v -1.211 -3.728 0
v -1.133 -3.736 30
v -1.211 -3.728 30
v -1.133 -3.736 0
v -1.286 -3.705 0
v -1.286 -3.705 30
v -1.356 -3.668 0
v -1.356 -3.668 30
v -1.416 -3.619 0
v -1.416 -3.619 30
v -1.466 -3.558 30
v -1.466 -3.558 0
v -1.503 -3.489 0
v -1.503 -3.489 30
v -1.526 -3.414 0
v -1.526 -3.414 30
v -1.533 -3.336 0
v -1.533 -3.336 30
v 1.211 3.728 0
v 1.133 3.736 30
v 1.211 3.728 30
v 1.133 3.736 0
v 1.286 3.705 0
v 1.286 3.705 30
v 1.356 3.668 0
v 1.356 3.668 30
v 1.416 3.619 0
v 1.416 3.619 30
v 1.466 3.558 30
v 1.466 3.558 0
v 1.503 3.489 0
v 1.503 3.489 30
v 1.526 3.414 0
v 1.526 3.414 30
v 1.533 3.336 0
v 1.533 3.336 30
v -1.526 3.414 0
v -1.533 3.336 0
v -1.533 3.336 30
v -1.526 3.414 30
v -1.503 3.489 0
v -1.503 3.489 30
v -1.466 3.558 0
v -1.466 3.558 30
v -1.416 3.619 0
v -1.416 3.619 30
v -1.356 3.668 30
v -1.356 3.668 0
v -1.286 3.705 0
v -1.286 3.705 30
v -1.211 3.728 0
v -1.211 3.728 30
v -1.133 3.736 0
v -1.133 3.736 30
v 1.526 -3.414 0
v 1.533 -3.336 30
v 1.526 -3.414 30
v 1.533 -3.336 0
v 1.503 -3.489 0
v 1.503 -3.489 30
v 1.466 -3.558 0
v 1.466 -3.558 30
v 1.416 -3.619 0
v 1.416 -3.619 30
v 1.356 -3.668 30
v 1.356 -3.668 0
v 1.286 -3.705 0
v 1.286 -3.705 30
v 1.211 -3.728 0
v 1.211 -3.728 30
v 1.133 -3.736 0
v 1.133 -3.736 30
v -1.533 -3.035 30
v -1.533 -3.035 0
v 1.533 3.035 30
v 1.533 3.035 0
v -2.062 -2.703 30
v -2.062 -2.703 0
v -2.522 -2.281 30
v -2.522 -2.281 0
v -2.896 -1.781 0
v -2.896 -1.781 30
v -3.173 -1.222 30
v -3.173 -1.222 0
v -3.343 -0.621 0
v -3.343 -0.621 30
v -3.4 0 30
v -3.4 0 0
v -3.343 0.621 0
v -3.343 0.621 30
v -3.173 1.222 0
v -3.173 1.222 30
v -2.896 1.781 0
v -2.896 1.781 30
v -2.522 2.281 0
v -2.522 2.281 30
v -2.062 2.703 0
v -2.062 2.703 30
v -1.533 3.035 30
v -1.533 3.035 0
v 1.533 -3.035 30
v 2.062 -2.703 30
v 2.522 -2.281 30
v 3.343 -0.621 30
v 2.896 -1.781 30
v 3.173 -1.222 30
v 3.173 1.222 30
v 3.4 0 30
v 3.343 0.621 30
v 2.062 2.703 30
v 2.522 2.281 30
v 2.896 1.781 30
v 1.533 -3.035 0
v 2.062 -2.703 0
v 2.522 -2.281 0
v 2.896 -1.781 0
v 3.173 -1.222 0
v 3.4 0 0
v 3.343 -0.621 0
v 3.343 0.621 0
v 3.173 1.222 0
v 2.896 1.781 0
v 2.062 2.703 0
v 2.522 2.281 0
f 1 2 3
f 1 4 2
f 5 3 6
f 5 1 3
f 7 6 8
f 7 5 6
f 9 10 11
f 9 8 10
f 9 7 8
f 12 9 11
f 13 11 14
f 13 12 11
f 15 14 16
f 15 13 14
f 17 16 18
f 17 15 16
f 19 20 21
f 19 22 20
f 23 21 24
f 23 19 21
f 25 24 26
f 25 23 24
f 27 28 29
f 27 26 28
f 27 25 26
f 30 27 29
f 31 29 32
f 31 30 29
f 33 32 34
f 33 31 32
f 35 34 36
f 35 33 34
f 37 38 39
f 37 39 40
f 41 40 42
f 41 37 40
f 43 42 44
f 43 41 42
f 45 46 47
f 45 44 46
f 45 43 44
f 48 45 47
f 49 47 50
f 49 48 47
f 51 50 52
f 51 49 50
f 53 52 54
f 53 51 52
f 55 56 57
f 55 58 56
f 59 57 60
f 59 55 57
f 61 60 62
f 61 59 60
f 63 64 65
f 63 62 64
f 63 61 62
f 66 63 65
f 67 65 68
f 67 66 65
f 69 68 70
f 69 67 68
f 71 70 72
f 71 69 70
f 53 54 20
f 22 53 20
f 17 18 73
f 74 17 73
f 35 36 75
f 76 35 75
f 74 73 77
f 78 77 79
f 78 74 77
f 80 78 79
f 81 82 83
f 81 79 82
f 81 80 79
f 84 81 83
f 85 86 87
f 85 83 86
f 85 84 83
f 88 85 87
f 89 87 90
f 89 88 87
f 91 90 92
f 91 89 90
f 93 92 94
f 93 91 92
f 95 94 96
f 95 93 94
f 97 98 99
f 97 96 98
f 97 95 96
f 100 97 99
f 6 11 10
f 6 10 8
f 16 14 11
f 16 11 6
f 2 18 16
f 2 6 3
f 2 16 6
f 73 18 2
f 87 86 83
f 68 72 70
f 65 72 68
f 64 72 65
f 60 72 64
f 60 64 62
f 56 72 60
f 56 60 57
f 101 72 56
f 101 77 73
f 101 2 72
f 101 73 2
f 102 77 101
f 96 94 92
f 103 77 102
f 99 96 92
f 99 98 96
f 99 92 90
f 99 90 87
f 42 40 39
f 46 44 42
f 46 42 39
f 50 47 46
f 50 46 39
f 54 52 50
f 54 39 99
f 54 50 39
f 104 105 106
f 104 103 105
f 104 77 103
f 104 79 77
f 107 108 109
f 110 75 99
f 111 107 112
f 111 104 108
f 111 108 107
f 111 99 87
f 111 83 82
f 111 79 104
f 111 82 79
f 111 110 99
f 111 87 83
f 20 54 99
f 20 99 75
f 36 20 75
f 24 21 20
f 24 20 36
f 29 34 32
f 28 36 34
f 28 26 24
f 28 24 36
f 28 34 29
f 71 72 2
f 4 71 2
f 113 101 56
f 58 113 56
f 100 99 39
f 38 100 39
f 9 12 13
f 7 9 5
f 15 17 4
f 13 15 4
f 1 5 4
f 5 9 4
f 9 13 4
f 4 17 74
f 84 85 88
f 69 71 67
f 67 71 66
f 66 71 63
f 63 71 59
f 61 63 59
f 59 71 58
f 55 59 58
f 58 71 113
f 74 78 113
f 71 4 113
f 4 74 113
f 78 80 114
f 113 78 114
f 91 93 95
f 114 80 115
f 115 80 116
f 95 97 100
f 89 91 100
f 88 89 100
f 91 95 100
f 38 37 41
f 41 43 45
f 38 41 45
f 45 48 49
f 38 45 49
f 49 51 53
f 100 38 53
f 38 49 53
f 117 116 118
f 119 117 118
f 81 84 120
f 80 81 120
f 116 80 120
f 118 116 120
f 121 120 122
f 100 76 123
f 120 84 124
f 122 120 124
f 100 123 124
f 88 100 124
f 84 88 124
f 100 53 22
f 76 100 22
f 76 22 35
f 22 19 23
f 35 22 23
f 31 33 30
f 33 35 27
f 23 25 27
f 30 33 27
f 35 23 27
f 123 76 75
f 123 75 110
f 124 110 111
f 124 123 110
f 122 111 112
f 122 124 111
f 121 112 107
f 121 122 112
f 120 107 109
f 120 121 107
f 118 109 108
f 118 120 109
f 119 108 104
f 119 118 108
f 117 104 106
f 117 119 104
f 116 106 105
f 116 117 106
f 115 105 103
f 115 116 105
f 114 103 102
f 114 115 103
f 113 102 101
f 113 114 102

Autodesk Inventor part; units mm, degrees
ref_plane "YZ Plane" through (0, 0, 0) normal (1, 0, 0) x (0, 1, 0)
ref_plane "XZ Plane" through (0, 0, 0) normal (0, 1, 0) x (-1, 0, 0)
ref_plane "XY Plane" through (0, 0, 0) normal (0, 0, 1) x (1, 0, 0)
sketch "Sketch1" plane through (0, 0, 0) normal (0, 0, 1) x (1, 0, 0)
  circle A0 centre (0, 0) radius 3.4
  line L0 (1.1333, -3.7357) -> (-1.1333, -3.7357)
  line L1 (-1.5333, -3.3357) -> (-1.5333, 3.3357)
  line L2 (-1.1333, 3.7357) -> (1.1333, 3.7357)
  line L3 (1.5333, 3.3357) -> (1.5333, -3.3357)
  line L4 (1.5333, -3.7357) -> (-1.5333, 3.7357) construction
  line L5 (-1.5333, -3.7357) -> (1.5333, 3.7357) construction
  arc A1 (-1.1333, 3.7357) -> (-1.5333, 3.3357) centre (-1.1333, 3.3357) ccw
  arc A2 (1.5333, 3.3357) -> (1.1333, 3.7357) centre (1.1333, 3.3357) ccw
  arc A3 (1.1333, -3.7357) -> (1.5333, -3.3357) centre (1.1333, -3.3357) ccw
  arc A4 (-1.5333, -3.3357) -> (-1.1333, -3.7357) centre (-1.1333, -3.3357) ccw
  point P0 (-1.5333, 3.0346)
  point P1 (-1.5333, -3.0346)
  point P2 (1.5333, -3.0346)
  point P3 (1.5333, 3.0346)
  point P4 (-0.9416, 2.2076)
  point P5 (-0.9416, -2.2076)
  point P6 (0.9416, -2.2076)
  point P7 (0.9416, 2.2076)
  dimension "d0" = 6.8
  dimension "d1" = 3.0667
  dimension "d2" = 7.4714
  dimension "d3" = 0.4
extrude "Extrusion1" add sketch "Sketch1" along normal blind 30
equation "\"d0\" = D_axel - d_toleransAxel"
equation "\"d3\" = r_filletAxel"
equation "\"d4\" = h_axel"
equation "\"D_axel\" = D_axel_1"
equation "\"d_axelRing\" = d_axelRing_1"
equation "\"r_filletAxel\" = r_filletAxel_1"
equation "\"d_toleransAxel\" = 0.2"
equation "\"h_axel\" = 30"
equation "\"D_axel_1\" = 7"
equation "\"d_axelRing_1\" = 3"
equation "\"r_filletAxel_1\" = 0.4"
properties part number "Axel_parametriserad_03"
